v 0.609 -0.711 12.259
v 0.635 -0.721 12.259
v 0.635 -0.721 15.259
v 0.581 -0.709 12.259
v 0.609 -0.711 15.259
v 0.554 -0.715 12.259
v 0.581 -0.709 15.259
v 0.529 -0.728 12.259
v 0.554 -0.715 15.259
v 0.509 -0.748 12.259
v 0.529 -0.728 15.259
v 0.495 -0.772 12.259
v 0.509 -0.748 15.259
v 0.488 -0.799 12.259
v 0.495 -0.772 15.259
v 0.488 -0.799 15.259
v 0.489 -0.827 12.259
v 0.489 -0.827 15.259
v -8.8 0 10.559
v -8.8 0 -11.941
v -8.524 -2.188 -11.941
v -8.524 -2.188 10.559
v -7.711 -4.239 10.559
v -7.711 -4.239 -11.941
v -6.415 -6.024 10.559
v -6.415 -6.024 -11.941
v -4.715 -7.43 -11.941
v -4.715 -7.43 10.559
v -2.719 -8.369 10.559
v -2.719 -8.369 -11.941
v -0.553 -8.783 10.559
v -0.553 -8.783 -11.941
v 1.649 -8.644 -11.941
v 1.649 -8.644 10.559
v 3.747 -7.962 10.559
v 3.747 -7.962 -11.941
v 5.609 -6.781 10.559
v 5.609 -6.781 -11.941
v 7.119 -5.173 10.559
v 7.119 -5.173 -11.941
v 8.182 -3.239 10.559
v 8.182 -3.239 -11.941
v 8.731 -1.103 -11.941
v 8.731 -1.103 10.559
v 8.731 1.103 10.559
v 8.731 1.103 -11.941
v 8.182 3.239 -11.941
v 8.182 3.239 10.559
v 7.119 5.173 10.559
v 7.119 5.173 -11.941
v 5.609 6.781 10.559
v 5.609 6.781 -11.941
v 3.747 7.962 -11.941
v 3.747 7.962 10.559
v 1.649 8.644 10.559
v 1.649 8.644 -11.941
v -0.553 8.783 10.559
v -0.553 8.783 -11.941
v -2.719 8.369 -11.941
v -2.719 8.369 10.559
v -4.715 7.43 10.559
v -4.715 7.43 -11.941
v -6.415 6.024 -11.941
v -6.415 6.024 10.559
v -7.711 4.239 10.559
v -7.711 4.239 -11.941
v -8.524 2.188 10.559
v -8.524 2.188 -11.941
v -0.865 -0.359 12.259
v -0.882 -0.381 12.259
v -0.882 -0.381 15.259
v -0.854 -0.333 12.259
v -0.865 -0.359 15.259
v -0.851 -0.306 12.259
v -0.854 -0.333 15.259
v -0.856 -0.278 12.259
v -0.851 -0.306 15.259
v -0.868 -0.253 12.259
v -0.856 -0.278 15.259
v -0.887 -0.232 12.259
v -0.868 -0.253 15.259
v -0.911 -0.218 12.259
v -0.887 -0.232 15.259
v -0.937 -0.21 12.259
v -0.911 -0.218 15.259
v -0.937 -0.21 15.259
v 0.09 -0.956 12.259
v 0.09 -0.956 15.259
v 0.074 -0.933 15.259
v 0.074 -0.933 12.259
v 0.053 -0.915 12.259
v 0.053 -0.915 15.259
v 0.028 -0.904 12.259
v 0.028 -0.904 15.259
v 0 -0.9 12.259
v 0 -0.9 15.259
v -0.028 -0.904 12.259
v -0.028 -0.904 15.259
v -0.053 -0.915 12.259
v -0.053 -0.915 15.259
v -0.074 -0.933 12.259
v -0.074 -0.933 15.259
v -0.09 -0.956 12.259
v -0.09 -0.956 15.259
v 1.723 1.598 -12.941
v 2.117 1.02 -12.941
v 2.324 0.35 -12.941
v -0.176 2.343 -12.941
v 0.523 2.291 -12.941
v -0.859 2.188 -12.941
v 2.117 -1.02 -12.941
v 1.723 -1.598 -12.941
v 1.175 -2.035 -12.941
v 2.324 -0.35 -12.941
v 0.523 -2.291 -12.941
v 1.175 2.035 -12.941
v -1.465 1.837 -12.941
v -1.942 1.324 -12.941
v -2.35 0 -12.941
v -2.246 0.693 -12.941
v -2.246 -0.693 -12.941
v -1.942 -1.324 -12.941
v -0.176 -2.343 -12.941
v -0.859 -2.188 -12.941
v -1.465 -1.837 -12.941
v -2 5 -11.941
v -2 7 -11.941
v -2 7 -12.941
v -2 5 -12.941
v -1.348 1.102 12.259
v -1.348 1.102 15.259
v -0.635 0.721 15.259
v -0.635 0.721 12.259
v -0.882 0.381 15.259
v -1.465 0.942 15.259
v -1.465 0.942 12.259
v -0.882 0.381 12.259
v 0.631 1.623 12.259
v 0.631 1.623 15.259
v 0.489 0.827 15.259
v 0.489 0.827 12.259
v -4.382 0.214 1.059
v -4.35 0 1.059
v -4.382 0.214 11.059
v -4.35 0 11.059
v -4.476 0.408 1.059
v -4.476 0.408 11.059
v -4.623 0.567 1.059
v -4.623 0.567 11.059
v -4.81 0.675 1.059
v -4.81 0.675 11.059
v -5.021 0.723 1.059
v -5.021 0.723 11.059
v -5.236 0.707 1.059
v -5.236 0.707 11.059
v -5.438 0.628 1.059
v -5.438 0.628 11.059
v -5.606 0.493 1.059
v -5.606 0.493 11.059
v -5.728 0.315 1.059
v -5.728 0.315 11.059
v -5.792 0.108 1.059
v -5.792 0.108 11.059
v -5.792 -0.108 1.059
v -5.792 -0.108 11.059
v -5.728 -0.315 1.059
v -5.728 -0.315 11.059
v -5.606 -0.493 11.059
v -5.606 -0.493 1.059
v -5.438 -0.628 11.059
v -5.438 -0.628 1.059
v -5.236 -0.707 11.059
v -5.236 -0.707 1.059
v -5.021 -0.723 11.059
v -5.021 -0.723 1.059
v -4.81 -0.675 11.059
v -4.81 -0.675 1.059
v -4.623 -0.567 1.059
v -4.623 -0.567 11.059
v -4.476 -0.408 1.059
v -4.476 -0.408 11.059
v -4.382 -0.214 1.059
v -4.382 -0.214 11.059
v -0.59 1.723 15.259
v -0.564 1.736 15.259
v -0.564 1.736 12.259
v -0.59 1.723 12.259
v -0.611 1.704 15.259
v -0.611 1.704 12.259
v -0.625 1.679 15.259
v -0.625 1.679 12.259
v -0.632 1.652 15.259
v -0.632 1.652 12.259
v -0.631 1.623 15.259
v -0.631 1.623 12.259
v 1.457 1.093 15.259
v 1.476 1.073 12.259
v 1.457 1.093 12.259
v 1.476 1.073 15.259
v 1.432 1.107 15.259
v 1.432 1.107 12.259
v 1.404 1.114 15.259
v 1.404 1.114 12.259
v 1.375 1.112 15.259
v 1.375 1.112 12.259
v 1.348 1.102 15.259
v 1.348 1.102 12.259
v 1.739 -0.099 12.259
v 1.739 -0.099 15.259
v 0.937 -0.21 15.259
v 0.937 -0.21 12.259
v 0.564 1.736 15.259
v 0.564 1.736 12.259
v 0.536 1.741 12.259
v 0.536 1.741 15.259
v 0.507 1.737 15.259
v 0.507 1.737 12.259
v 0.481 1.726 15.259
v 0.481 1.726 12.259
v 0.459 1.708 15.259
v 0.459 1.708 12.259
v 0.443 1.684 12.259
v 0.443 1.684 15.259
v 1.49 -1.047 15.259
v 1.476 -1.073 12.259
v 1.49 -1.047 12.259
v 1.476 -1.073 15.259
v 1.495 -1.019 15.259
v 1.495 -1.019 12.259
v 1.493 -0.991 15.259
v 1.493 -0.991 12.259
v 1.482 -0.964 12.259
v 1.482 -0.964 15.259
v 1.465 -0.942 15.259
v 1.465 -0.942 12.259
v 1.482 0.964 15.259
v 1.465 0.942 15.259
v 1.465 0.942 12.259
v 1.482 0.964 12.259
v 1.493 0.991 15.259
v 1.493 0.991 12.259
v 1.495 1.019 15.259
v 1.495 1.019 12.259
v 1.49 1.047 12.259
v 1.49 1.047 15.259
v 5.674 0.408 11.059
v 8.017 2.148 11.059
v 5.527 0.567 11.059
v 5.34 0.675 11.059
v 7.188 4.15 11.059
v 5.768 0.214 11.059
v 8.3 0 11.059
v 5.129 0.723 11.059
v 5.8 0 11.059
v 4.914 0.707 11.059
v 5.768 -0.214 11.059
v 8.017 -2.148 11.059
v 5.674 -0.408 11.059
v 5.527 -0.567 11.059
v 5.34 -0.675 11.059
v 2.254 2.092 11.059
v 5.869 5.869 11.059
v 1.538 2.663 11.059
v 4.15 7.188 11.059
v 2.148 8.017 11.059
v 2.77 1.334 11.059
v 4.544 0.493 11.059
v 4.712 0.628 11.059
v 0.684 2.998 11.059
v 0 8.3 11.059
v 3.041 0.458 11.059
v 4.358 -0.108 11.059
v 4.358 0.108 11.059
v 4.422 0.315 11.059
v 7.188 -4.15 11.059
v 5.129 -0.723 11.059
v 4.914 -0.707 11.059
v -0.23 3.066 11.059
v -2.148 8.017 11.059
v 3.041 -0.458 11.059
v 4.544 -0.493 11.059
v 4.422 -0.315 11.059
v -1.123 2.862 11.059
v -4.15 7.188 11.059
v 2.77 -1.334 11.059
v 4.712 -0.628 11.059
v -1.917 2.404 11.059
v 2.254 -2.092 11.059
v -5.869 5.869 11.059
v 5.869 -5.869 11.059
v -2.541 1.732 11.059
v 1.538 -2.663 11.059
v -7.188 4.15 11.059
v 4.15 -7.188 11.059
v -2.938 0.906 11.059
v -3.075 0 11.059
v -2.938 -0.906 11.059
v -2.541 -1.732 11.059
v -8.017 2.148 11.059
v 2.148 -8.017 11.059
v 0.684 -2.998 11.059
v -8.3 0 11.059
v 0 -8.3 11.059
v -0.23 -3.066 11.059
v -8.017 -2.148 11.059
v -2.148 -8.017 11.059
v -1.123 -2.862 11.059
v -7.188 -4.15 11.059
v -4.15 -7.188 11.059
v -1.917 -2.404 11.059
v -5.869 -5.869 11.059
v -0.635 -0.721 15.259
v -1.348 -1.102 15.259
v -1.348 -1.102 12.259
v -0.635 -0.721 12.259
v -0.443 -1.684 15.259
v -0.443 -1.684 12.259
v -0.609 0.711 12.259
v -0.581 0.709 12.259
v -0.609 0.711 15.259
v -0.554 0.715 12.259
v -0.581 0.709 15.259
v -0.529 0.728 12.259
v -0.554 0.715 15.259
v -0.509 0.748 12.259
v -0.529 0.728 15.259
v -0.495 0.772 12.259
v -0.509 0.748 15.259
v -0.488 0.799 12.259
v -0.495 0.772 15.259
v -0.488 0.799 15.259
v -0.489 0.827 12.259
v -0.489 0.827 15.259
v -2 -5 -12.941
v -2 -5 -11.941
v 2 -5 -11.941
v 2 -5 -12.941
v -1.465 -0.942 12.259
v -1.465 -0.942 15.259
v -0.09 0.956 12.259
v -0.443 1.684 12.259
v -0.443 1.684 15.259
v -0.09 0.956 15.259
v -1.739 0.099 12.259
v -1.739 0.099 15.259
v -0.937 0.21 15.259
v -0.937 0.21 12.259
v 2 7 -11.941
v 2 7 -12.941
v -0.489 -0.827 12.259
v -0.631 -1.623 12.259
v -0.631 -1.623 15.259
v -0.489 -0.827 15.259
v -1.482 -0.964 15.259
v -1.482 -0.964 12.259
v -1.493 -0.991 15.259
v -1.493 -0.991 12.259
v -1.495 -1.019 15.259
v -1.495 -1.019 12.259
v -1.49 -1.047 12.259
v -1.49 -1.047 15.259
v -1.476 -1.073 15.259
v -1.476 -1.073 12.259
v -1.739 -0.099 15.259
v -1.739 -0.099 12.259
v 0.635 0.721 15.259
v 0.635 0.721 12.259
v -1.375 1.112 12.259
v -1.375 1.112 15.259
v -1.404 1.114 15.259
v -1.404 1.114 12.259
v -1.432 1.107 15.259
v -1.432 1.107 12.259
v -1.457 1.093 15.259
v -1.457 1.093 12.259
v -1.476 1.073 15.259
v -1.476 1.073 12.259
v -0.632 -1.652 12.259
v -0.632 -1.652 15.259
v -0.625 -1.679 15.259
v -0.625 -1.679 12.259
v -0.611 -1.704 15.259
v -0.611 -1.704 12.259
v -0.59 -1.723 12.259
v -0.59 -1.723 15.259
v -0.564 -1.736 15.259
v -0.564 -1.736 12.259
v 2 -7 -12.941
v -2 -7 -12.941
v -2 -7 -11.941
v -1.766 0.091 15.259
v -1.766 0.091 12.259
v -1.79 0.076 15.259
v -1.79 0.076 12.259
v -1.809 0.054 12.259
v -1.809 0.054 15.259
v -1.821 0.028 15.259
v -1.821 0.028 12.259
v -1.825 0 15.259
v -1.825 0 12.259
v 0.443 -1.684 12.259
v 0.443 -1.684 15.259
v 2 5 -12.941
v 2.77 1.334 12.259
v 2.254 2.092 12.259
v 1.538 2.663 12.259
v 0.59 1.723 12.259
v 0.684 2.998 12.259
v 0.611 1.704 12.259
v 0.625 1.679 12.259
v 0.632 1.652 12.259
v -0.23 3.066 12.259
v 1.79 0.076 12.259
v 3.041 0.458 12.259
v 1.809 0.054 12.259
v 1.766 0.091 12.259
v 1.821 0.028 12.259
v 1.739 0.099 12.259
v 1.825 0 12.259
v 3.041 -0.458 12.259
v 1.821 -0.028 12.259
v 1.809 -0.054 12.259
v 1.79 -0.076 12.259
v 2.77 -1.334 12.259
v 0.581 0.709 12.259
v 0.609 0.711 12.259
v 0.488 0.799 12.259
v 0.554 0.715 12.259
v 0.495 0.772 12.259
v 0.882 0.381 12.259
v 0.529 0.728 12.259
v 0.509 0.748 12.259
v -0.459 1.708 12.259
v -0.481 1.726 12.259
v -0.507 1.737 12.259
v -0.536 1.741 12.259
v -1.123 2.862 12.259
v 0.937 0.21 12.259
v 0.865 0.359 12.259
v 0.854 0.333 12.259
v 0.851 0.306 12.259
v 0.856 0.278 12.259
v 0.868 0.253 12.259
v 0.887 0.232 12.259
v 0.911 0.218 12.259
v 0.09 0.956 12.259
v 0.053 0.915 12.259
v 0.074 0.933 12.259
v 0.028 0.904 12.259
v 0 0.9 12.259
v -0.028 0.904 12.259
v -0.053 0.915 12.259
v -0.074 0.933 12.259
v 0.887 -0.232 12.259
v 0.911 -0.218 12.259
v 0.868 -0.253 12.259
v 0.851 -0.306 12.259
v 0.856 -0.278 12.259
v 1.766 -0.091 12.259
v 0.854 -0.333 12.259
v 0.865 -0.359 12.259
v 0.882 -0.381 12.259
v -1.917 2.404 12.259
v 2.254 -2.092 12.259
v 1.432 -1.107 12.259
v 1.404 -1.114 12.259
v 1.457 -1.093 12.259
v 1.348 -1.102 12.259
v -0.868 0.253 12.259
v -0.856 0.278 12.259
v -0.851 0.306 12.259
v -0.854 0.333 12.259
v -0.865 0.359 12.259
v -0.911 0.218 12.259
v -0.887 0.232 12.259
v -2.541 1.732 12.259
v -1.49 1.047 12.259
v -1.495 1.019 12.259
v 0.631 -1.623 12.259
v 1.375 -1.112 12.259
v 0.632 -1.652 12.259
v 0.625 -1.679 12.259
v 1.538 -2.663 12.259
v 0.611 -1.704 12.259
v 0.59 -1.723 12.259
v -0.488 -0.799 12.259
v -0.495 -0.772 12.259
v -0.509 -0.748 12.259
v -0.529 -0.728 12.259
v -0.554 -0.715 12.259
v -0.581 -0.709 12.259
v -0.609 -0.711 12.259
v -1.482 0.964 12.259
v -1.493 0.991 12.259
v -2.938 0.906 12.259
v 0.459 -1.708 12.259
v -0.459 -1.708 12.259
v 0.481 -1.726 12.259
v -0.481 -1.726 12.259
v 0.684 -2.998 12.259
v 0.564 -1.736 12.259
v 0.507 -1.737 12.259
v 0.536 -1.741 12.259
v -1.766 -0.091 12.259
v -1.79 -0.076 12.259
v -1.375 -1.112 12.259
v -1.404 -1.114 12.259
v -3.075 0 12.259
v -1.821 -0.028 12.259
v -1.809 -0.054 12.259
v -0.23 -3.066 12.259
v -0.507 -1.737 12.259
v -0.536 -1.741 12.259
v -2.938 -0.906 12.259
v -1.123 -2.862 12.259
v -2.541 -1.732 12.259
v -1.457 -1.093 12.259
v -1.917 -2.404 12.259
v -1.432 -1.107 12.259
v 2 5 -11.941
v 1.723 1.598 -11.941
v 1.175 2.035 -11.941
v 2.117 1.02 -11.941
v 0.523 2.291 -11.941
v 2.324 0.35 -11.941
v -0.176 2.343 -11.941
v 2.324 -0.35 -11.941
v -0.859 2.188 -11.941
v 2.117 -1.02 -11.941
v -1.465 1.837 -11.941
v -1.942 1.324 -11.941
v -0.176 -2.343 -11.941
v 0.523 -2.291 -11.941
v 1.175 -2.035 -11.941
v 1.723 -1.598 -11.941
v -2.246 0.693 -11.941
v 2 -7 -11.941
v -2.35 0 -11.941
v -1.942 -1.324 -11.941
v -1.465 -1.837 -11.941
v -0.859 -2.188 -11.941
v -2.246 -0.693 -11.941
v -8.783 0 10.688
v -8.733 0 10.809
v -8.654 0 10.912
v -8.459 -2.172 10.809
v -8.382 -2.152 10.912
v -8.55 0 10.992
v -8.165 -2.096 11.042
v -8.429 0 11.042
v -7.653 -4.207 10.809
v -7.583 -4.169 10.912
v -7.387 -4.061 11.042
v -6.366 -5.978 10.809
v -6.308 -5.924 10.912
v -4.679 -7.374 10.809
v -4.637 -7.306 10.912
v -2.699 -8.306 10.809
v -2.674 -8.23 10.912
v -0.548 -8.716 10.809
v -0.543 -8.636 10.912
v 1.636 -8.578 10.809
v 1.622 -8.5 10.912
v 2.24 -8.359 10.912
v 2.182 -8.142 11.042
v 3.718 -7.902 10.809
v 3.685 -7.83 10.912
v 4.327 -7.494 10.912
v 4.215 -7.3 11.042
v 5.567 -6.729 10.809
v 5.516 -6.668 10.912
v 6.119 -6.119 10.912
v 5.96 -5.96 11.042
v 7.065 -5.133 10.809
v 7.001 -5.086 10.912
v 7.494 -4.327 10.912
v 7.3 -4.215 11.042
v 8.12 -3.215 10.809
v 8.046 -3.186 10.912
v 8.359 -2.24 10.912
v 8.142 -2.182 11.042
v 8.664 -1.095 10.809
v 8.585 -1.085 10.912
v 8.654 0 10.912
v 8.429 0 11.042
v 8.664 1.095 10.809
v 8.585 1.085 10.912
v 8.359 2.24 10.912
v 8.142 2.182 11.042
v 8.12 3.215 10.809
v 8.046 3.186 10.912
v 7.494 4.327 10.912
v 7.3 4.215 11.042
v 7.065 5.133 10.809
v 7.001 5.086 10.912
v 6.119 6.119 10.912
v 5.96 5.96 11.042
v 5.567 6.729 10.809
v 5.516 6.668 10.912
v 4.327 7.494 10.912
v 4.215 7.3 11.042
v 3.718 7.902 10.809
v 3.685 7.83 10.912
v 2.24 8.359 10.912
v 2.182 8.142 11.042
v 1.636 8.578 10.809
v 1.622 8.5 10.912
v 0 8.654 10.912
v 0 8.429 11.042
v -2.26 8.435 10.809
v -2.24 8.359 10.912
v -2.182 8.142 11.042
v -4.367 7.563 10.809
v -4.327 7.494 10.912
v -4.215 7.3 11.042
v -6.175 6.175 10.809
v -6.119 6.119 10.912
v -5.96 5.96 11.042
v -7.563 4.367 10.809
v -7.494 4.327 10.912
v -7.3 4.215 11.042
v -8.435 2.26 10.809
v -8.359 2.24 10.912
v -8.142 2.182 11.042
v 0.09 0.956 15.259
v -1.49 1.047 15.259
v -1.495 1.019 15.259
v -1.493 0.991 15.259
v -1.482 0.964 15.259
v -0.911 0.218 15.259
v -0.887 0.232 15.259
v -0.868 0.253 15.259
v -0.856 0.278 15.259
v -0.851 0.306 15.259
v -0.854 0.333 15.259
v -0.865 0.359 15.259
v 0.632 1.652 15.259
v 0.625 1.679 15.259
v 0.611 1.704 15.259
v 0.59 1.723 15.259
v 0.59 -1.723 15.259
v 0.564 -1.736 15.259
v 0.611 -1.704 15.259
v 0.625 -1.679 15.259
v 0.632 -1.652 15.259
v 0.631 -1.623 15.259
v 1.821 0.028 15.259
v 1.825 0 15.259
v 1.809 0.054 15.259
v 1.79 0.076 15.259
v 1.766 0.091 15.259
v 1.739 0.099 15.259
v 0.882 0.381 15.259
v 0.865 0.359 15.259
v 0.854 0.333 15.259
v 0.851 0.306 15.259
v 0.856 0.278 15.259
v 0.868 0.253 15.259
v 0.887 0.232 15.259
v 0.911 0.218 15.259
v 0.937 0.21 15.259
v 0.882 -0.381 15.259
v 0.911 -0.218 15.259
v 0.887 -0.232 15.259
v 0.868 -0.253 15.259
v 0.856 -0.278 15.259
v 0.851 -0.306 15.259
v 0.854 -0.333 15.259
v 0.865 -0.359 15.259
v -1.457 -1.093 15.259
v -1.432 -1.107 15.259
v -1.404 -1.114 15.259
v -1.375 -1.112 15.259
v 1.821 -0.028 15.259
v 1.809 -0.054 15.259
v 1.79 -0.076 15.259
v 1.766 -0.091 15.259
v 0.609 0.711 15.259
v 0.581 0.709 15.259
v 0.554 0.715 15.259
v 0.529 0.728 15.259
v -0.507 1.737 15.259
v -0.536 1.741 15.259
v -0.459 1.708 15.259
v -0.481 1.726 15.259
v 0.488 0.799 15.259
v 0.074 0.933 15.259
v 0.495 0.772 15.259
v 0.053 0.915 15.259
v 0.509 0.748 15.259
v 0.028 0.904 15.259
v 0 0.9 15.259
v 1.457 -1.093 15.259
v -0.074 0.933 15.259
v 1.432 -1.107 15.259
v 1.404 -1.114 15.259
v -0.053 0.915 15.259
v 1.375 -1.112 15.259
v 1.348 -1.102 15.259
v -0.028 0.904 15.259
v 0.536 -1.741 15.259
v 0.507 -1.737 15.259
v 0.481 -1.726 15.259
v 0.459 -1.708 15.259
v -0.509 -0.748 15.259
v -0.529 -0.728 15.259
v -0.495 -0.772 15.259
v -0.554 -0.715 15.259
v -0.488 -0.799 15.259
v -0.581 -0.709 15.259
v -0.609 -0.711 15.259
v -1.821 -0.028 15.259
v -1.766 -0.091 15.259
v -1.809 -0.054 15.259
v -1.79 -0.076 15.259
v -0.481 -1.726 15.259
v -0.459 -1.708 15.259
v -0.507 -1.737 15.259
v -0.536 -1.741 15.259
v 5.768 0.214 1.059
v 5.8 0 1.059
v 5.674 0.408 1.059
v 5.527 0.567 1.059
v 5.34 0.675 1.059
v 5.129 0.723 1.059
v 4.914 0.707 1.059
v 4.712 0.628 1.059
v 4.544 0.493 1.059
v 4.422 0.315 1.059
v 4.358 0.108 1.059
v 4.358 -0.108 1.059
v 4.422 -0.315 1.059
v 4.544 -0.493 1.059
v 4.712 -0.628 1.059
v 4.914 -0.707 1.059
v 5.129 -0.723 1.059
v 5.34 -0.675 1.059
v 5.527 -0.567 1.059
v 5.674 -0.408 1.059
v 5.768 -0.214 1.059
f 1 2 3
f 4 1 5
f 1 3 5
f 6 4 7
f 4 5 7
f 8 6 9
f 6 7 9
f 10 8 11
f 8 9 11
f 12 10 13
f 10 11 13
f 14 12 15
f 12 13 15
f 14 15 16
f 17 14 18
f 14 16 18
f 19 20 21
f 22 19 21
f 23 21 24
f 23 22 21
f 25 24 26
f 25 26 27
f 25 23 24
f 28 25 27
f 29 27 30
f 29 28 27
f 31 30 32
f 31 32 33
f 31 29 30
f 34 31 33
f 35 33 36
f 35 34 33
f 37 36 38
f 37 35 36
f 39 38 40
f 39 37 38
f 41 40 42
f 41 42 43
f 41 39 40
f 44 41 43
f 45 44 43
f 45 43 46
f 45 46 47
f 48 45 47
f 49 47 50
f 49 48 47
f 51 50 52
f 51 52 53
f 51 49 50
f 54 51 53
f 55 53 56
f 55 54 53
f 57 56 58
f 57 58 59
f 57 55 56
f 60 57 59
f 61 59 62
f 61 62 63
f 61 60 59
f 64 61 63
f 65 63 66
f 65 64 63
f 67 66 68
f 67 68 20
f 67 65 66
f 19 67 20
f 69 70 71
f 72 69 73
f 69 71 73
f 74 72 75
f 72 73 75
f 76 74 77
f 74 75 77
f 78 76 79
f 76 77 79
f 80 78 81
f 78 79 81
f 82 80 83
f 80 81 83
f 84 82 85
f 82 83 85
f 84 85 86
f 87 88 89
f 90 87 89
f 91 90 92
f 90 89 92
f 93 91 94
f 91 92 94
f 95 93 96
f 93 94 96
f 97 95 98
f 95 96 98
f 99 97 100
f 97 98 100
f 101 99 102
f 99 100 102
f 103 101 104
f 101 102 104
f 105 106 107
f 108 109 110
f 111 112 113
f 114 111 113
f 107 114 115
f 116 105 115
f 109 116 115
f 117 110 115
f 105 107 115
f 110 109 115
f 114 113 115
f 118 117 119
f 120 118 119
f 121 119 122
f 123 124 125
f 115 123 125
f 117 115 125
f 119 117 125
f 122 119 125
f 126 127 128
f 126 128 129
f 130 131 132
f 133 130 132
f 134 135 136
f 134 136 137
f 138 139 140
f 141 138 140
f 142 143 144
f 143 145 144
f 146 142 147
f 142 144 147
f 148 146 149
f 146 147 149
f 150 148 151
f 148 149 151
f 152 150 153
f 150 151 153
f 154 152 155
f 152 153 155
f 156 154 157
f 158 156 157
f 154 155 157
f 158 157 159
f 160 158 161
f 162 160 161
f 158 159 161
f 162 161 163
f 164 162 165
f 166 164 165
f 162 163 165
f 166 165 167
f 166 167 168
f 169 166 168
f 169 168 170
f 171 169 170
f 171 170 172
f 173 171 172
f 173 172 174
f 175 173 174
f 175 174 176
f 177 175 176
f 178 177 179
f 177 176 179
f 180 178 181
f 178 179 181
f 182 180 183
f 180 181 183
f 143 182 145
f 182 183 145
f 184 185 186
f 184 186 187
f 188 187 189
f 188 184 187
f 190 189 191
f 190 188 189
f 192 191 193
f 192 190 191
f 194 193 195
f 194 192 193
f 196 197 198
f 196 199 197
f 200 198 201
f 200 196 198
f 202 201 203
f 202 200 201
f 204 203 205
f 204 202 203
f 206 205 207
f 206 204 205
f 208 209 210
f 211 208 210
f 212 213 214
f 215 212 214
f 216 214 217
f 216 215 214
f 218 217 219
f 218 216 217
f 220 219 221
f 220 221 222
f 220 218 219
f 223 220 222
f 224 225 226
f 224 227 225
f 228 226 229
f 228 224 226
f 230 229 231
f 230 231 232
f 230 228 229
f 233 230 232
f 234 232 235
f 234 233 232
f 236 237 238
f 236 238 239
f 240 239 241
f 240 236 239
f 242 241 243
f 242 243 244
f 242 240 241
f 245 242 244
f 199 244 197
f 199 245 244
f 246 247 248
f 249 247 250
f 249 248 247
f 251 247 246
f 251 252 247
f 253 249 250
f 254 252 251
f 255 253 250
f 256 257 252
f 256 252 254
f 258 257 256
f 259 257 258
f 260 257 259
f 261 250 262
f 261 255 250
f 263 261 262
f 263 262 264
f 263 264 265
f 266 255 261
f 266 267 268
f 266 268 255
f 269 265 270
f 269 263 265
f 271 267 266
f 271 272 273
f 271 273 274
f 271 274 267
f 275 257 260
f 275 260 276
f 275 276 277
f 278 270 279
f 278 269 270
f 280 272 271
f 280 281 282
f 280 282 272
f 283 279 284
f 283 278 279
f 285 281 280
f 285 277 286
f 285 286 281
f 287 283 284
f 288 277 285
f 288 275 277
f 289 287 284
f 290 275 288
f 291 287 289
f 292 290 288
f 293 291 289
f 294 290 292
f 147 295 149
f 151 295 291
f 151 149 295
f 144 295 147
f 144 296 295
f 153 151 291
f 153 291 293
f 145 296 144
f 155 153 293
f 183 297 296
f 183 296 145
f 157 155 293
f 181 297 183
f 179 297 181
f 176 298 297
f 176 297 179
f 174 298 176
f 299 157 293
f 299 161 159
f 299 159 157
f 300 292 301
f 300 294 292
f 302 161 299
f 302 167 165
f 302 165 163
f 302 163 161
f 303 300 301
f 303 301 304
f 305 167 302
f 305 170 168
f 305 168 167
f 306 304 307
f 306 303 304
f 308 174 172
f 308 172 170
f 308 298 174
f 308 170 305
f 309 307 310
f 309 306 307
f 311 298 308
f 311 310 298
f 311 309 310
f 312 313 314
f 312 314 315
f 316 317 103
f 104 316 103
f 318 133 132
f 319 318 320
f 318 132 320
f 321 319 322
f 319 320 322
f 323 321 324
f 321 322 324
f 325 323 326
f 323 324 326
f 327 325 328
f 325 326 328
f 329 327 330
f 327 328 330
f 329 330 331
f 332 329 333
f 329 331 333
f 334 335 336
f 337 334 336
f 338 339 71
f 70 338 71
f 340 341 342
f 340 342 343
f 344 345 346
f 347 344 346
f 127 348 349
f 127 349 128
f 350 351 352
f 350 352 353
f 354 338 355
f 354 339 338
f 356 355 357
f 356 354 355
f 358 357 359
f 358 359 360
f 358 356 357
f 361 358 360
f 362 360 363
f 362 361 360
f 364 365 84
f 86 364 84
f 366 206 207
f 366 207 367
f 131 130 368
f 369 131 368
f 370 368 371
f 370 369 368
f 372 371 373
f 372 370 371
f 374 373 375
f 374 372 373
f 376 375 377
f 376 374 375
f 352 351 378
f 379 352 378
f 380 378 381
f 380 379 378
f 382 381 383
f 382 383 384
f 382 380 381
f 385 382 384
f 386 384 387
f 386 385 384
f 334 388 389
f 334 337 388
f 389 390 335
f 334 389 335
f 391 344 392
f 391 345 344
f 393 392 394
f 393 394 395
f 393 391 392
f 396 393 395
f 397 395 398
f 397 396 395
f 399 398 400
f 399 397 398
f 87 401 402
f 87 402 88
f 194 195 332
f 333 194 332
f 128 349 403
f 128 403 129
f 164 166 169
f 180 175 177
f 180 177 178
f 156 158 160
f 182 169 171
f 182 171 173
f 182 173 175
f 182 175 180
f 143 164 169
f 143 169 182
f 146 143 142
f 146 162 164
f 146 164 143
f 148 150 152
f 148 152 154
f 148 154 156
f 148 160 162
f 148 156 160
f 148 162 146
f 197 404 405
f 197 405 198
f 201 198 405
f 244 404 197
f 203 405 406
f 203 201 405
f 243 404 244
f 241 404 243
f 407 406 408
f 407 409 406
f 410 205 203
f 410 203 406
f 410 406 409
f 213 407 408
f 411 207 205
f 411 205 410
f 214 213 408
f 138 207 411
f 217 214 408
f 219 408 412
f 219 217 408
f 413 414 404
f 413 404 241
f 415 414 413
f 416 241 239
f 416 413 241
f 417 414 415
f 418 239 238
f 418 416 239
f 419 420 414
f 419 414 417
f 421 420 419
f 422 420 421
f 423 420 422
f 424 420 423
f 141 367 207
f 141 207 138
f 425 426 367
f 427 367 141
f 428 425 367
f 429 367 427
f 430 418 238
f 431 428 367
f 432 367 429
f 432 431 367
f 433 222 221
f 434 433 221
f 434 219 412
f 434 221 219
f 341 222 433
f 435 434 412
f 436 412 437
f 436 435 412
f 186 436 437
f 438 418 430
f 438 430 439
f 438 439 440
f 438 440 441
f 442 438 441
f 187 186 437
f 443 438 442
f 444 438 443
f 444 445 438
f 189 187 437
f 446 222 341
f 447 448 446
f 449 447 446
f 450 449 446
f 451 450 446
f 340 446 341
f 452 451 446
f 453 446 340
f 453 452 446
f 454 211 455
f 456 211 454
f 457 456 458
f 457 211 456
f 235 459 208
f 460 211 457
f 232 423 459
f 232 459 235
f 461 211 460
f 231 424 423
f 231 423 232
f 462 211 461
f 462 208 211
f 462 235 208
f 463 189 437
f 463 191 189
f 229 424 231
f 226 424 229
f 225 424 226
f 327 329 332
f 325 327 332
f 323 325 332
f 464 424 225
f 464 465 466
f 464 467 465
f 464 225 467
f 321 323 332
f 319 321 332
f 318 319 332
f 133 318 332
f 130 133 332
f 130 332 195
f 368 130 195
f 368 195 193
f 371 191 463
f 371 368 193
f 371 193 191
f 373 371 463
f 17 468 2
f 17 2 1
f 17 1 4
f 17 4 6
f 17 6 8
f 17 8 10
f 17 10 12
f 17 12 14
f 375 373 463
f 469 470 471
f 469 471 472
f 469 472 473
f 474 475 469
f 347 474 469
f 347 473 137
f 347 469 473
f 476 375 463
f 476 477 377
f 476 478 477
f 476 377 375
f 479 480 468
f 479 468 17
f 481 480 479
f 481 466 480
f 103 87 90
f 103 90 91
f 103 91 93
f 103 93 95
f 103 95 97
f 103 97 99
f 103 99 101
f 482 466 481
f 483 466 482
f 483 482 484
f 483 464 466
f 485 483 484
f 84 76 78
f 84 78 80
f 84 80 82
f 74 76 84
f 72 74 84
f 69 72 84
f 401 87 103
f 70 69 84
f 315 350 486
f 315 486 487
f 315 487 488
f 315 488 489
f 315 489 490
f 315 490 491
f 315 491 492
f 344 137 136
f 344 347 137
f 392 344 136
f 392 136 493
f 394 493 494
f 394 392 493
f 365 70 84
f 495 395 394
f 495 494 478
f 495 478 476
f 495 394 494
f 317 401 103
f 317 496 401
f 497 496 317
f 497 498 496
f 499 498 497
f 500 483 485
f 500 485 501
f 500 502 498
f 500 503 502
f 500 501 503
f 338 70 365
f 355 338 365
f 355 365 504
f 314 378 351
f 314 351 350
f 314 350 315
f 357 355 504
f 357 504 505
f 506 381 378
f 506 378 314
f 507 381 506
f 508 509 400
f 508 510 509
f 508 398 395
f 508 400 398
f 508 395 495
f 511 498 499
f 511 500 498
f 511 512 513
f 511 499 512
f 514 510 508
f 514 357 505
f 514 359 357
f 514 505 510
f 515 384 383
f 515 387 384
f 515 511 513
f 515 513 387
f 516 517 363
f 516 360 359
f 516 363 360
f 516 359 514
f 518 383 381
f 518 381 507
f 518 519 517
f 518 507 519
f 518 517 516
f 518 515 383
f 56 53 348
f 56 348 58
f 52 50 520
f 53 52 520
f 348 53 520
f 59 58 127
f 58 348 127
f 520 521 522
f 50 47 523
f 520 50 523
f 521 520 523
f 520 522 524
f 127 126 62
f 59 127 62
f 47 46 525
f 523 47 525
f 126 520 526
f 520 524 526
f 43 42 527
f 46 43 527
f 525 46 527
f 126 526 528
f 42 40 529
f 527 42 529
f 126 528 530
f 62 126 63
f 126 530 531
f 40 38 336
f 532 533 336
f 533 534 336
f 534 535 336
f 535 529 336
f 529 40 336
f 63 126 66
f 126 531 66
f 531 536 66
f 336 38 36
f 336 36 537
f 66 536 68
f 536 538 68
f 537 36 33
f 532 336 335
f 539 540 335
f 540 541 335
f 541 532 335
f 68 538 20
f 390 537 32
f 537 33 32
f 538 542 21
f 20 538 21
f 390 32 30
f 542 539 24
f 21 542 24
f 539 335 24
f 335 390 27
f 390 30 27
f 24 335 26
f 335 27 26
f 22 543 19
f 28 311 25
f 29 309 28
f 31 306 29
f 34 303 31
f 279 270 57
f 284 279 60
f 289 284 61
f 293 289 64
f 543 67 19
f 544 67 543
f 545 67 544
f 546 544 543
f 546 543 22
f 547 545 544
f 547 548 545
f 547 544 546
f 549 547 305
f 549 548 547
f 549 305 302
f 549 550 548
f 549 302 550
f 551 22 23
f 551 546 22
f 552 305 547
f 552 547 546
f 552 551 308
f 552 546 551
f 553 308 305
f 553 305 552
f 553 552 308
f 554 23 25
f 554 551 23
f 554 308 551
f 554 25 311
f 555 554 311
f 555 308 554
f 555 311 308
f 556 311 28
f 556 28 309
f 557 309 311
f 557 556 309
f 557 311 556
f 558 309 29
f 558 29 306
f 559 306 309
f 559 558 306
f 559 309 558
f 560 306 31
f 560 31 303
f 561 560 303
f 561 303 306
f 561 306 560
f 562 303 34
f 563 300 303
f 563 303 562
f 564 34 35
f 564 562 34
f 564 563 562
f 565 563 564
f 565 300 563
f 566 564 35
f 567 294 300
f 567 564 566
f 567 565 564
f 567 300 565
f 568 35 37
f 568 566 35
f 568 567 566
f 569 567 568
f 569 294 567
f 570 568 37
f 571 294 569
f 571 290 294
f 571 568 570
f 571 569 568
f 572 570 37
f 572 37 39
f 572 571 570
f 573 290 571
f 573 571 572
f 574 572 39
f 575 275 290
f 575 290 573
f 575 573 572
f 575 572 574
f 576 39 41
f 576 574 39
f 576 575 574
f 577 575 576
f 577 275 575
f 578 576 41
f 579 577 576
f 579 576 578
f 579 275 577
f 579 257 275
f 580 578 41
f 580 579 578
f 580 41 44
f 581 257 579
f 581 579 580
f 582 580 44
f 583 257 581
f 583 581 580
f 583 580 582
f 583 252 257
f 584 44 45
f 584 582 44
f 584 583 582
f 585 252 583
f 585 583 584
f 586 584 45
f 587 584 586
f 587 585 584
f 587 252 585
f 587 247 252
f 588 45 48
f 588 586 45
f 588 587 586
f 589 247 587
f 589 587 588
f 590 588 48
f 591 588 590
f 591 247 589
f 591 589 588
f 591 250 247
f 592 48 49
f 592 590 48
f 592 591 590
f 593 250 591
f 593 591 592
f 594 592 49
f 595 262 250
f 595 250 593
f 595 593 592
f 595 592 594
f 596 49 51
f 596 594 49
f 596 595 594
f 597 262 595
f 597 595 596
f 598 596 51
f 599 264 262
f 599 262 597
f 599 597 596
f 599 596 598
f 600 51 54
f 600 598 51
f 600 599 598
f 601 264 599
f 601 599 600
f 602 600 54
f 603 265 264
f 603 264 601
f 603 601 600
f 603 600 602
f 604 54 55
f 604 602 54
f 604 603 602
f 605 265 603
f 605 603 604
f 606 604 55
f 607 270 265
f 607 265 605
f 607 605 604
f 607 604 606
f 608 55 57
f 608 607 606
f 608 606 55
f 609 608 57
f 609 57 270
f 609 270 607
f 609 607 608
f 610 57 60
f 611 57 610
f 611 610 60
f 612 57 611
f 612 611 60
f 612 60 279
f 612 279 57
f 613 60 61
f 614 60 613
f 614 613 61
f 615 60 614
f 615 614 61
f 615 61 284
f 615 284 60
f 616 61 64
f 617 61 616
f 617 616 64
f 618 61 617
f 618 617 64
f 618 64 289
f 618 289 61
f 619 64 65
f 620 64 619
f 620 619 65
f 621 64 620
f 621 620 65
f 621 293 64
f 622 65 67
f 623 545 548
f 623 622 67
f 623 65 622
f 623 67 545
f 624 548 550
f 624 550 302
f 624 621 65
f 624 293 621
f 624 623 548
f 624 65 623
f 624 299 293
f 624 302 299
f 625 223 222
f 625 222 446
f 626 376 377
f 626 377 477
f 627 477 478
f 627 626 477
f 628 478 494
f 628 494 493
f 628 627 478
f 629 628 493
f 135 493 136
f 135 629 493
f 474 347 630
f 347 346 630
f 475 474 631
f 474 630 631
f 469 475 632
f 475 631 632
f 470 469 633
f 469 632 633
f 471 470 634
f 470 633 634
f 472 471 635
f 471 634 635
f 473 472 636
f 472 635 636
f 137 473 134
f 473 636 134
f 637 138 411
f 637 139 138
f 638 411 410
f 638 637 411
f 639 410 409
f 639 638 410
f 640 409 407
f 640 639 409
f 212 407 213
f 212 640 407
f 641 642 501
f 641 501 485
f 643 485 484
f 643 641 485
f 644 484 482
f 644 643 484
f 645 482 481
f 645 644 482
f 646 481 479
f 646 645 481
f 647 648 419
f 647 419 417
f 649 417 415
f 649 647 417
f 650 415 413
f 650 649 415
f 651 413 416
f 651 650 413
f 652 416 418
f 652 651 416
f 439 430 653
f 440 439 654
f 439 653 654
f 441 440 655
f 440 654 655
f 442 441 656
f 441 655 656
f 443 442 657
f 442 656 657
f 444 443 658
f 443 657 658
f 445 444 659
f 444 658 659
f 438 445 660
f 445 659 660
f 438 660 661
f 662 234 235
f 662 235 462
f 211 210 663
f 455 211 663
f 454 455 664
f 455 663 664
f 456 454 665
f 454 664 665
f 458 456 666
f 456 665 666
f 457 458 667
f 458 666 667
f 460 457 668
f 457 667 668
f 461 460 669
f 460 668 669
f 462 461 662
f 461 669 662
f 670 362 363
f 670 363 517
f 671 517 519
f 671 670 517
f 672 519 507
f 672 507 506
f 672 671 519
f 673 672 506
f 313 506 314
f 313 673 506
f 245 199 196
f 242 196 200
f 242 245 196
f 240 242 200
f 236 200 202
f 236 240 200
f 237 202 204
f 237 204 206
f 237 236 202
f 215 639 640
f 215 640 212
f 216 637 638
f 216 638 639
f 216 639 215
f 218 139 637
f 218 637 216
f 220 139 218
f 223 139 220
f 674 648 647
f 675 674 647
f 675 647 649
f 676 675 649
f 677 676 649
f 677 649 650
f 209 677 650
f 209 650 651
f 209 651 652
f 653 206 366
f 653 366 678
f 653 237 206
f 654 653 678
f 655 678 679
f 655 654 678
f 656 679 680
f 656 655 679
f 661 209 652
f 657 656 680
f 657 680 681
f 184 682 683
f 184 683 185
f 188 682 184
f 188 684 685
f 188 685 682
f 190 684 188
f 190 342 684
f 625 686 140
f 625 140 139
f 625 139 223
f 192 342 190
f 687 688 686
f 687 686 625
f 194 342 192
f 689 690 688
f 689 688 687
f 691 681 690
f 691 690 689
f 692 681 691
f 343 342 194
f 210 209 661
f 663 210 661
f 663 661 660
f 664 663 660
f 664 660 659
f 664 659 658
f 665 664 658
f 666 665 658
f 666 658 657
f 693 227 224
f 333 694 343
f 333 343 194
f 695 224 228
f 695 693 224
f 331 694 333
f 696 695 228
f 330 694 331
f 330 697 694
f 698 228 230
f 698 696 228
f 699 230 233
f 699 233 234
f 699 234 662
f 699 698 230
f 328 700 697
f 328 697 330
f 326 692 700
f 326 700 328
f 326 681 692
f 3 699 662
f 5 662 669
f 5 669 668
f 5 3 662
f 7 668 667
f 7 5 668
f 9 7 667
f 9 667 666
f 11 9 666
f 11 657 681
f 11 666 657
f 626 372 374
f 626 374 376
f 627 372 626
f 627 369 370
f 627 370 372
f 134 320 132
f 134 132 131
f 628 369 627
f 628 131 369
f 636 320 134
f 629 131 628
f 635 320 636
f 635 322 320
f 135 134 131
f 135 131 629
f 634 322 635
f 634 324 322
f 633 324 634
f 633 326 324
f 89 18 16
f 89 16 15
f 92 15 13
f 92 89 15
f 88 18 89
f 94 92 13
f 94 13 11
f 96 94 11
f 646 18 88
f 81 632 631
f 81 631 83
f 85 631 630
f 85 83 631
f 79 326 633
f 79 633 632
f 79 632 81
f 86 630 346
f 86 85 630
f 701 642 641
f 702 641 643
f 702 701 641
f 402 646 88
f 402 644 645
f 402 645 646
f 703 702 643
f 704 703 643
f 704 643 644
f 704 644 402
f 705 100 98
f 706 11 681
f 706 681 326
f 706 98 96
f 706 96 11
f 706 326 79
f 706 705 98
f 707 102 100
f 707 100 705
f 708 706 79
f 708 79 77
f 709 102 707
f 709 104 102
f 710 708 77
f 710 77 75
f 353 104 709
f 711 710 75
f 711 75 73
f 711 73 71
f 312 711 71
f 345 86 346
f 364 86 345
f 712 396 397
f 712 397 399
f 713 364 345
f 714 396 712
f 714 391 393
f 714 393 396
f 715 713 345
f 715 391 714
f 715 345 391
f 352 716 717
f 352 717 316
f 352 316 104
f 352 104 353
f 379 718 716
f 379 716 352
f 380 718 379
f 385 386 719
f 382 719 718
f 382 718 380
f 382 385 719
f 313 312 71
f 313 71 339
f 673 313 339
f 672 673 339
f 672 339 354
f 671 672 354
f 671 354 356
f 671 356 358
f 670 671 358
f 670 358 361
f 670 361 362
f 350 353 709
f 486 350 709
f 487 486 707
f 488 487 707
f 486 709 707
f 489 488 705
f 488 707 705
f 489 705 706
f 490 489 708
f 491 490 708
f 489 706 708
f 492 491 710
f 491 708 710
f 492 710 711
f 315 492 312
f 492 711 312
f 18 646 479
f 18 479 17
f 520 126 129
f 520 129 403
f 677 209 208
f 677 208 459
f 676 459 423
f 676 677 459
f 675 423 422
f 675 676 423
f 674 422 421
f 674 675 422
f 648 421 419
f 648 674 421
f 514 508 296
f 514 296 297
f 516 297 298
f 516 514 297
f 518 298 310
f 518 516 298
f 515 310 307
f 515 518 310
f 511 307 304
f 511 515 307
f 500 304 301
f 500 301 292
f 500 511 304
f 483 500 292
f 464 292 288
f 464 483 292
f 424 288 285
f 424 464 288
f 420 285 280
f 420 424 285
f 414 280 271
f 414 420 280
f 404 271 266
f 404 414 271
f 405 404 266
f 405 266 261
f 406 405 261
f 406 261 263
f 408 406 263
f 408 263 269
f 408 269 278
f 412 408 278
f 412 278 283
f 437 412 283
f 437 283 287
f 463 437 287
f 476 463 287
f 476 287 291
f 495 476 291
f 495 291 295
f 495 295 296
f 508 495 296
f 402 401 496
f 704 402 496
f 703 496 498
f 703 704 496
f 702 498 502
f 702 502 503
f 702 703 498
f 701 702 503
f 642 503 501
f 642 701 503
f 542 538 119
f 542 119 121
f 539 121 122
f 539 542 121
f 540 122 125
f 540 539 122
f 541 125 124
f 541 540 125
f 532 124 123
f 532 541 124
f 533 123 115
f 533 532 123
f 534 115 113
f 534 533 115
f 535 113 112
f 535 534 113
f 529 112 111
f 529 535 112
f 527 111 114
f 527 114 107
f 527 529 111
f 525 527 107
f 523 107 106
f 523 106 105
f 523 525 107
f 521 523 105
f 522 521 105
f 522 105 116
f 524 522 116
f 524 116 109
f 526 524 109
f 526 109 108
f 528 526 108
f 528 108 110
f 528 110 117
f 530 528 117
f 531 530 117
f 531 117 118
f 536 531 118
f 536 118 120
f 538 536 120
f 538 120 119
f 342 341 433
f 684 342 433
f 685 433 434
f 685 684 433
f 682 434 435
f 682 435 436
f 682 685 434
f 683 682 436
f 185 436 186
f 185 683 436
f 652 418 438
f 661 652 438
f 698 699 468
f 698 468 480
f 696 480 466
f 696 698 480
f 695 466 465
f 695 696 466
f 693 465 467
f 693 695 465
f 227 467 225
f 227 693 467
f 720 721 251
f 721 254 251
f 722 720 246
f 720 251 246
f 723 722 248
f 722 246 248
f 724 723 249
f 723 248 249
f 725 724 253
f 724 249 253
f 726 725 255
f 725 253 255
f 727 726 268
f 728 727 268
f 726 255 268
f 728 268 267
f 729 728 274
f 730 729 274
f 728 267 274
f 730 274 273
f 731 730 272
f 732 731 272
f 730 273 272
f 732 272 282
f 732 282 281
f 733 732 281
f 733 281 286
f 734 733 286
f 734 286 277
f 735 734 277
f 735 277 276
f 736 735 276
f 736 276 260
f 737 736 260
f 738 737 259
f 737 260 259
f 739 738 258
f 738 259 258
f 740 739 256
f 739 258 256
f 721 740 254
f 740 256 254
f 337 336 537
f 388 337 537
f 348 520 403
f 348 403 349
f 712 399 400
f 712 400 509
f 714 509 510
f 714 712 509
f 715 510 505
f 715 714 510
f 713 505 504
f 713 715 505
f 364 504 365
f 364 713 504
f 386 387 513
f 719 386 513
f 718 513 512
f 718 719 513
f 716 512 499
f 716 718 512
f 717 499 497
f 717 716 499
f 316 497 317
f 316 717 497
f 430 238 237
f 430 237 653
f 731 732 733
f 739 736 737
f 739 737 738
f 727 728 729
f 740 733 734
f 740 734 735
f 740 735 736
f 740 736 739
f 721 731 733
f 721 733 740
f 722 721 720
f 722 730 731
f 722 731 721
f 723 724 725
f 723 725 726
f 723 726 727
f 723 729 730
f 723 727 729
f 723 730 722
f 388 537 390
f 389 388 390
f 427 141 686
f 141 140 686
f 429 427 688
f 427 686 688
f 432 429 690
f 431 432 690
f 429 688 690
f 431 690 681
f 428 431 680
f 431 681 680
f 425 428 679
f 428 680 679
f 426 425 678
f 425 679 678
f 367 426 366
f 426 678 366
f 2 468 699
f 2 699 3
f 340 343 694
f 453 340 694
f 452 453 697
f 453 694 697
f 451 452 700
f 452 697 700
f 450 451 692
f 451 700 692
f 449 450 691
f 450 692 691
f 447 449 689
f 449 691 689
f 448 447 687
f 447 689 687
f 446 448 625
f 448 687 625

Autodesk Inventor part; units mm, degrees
ref_plane "YZ Plane" through (0, 0, 0) normal (1, 0, 0) x (0, 1, 0)
ref_plane "XZ Plane" through (0, 0, 0) normal (0, 1, 0) x (-1, 0, 0)
ref_plane "XY Plane" through (0, 0, 0) normal (0, 0, 1) x (1, 0, 0)
sketch "Sketch1" plane through (0, 0, 0) normal (0, 1, 0) x (-1, 0, 0)
  line L0 (0, -22.2029) -> (0, 22.4648) projected
  line L1 (10.56, 0) -> (-1.76, 0) projected
  line L2 (0, 16.0837) -> (0, -15.8218)
  line L3 (0, -11.9411) -> (8.8, -11.9411)
  line L4 (8.8, -11.9411) -> (8.8, 11.0589)
  line L5 (8.8, 11.0589) -> (3.075, 11.0589)
  line L6 (3.075, 11.0589) -> (3.075, 12.2589)
  line L7 (3.075, 12.2589) -> (1.825, 12.2589)
  line L8 (1.825, 12.2589) -> (1.825, 15.2589)
  line L9 (1.825, 15.2589) -> (0, 15.2589)
  line L10 (0, -11.9411) -> (0, 15.2589)
  line L11 (0, -12.9411) -> (2.35, -12.9411)
  line L12 (2.35, -12.9411) -> (2.35, -11.9411)
  line L13 (0, -11.9411) -> (0, -12.9411)
  point P0 (0, 0)
  dimension "d0" = 17.6
  dimension "d1" = 23
  dimension "d2" = 1
  dimension "d3" = 4.7
  dimension "d4" = 6.15
  dimension "d5" = 3.65
  dimension "d6" = 1.2
  dimension "d7" = 3
revolve "Revolution1" add sketch "Sketch1" angle 360 about axis through (0, 0, -10) along (0, 0, 1)
sketch "Sketch2" plane through (0, 0, 11.0589) normal (0, 0, 1) x (1, 0, 0)
  line L0 (-12.32, 0) -> (12.32, 0) projected
  circle A0 centre (-5.075, 0) radius 0.725
  circle A1 centre (5.075, 0) radius 0.725
  line L1 (0, -12.32) -> (0, 12.32) projected
  dimension "d9" = 1.45
  dimension "d10" = 10.15
extrude "Extrusion1" cut sketch "Sketch2" against normal blind 10
sketch "Sketch3" plane through (0, 0, -11.9411) normal (0, 0, -1) x (-1, 0, 0)
  line L0 (12.32, 0) -> (-12.32, 0) projected
  line L1 (0, -12.32) -> (0, 12.32) projected
  line L2 (-2, 7) -> (2, 7)
  line L3 (2, 7) -> (2, 5)
  line L4 (2, 5) -> (-2, 5)
  line L5 (-2, 5) -> (-2, 7)
  line L6 (-2, 7) -> (2, 5) construction
  line L7 (2, 7) -> (-2, 5) construction
  line L8 (-2, -7) -> (2, -7)
  line L9 (2, -7) -> (2, -5)
  line L10 (2, -5) -> (-2, -5)
  line L11 (-2, -5) -> (-2, -7)
  line L12 (-2, -7) -> (2, -5) construction
  line L13 (2, -7) -> (-2, -5) construction
  point P0 (0, 6)
  point P1 (0, -6)
  dimension "d13" = 4
  dimension "d14" = 14
  dimension "d15" = 2
extrude "Extrusion2" add sketch "Sketch3" along normal blind 1
sketch "Sketch4" plane through (0, 0, 15.2589) normal (0, 0, 1) x (1, 0, 0)
  circle A0 centre (0, 0) radius 1.825 projected
  line L0 (0, -12.32) -> (0, 12.32) projected
  line L1 (-12.32, 0) -> (12.32, 0) projected
  line L2 (-0.4802, 1.7607) -> (0, 0.7709)
  line L3 (0.4802, 1.7607) -> (0, 0.7709)
  line L4 (0, 0) -> (-0.564, 1.7357) construction
  line L5 (0, 0) -> (0.564, 1.7357) construction
  arc A1 (-0.09, 0.9564) -> (0.09, 0.9564) centre (0, 1) ccw
  arc A2 (-0.4431, 1.6842) -> (-0.564, 1.7357) centre (-0.5331, 1.6406) ccw
  arc A3 (0.564, 1.7357) -> (0.4431, 1.6842) centre (0.5331, 1.6406) ccw
  line L6 (0, 1) -> (0, 1.825)
  dimension "d18" = 0.1
  dimension "d19" = 36
  dimension "d22" = 0.1
  dimension "d29" = 0.825
extrude "Extrusion3" cut sketch "Sketch4" against normal up to surface (3 mm away) contours A3 L3 A0 | L3 A1 L0 A0 | L0 A1 L2 A0 | A0 L2 A2
pattern_circular "Circular Pattern1" count 10 over 360 about axis through (0, 0, -10) along (0, 0, 1) of "Extrusion3"
fillet "Fillet1" radius 0.5 1 edges at (8.8, 0, 11.0589)
properties part number "empty"
